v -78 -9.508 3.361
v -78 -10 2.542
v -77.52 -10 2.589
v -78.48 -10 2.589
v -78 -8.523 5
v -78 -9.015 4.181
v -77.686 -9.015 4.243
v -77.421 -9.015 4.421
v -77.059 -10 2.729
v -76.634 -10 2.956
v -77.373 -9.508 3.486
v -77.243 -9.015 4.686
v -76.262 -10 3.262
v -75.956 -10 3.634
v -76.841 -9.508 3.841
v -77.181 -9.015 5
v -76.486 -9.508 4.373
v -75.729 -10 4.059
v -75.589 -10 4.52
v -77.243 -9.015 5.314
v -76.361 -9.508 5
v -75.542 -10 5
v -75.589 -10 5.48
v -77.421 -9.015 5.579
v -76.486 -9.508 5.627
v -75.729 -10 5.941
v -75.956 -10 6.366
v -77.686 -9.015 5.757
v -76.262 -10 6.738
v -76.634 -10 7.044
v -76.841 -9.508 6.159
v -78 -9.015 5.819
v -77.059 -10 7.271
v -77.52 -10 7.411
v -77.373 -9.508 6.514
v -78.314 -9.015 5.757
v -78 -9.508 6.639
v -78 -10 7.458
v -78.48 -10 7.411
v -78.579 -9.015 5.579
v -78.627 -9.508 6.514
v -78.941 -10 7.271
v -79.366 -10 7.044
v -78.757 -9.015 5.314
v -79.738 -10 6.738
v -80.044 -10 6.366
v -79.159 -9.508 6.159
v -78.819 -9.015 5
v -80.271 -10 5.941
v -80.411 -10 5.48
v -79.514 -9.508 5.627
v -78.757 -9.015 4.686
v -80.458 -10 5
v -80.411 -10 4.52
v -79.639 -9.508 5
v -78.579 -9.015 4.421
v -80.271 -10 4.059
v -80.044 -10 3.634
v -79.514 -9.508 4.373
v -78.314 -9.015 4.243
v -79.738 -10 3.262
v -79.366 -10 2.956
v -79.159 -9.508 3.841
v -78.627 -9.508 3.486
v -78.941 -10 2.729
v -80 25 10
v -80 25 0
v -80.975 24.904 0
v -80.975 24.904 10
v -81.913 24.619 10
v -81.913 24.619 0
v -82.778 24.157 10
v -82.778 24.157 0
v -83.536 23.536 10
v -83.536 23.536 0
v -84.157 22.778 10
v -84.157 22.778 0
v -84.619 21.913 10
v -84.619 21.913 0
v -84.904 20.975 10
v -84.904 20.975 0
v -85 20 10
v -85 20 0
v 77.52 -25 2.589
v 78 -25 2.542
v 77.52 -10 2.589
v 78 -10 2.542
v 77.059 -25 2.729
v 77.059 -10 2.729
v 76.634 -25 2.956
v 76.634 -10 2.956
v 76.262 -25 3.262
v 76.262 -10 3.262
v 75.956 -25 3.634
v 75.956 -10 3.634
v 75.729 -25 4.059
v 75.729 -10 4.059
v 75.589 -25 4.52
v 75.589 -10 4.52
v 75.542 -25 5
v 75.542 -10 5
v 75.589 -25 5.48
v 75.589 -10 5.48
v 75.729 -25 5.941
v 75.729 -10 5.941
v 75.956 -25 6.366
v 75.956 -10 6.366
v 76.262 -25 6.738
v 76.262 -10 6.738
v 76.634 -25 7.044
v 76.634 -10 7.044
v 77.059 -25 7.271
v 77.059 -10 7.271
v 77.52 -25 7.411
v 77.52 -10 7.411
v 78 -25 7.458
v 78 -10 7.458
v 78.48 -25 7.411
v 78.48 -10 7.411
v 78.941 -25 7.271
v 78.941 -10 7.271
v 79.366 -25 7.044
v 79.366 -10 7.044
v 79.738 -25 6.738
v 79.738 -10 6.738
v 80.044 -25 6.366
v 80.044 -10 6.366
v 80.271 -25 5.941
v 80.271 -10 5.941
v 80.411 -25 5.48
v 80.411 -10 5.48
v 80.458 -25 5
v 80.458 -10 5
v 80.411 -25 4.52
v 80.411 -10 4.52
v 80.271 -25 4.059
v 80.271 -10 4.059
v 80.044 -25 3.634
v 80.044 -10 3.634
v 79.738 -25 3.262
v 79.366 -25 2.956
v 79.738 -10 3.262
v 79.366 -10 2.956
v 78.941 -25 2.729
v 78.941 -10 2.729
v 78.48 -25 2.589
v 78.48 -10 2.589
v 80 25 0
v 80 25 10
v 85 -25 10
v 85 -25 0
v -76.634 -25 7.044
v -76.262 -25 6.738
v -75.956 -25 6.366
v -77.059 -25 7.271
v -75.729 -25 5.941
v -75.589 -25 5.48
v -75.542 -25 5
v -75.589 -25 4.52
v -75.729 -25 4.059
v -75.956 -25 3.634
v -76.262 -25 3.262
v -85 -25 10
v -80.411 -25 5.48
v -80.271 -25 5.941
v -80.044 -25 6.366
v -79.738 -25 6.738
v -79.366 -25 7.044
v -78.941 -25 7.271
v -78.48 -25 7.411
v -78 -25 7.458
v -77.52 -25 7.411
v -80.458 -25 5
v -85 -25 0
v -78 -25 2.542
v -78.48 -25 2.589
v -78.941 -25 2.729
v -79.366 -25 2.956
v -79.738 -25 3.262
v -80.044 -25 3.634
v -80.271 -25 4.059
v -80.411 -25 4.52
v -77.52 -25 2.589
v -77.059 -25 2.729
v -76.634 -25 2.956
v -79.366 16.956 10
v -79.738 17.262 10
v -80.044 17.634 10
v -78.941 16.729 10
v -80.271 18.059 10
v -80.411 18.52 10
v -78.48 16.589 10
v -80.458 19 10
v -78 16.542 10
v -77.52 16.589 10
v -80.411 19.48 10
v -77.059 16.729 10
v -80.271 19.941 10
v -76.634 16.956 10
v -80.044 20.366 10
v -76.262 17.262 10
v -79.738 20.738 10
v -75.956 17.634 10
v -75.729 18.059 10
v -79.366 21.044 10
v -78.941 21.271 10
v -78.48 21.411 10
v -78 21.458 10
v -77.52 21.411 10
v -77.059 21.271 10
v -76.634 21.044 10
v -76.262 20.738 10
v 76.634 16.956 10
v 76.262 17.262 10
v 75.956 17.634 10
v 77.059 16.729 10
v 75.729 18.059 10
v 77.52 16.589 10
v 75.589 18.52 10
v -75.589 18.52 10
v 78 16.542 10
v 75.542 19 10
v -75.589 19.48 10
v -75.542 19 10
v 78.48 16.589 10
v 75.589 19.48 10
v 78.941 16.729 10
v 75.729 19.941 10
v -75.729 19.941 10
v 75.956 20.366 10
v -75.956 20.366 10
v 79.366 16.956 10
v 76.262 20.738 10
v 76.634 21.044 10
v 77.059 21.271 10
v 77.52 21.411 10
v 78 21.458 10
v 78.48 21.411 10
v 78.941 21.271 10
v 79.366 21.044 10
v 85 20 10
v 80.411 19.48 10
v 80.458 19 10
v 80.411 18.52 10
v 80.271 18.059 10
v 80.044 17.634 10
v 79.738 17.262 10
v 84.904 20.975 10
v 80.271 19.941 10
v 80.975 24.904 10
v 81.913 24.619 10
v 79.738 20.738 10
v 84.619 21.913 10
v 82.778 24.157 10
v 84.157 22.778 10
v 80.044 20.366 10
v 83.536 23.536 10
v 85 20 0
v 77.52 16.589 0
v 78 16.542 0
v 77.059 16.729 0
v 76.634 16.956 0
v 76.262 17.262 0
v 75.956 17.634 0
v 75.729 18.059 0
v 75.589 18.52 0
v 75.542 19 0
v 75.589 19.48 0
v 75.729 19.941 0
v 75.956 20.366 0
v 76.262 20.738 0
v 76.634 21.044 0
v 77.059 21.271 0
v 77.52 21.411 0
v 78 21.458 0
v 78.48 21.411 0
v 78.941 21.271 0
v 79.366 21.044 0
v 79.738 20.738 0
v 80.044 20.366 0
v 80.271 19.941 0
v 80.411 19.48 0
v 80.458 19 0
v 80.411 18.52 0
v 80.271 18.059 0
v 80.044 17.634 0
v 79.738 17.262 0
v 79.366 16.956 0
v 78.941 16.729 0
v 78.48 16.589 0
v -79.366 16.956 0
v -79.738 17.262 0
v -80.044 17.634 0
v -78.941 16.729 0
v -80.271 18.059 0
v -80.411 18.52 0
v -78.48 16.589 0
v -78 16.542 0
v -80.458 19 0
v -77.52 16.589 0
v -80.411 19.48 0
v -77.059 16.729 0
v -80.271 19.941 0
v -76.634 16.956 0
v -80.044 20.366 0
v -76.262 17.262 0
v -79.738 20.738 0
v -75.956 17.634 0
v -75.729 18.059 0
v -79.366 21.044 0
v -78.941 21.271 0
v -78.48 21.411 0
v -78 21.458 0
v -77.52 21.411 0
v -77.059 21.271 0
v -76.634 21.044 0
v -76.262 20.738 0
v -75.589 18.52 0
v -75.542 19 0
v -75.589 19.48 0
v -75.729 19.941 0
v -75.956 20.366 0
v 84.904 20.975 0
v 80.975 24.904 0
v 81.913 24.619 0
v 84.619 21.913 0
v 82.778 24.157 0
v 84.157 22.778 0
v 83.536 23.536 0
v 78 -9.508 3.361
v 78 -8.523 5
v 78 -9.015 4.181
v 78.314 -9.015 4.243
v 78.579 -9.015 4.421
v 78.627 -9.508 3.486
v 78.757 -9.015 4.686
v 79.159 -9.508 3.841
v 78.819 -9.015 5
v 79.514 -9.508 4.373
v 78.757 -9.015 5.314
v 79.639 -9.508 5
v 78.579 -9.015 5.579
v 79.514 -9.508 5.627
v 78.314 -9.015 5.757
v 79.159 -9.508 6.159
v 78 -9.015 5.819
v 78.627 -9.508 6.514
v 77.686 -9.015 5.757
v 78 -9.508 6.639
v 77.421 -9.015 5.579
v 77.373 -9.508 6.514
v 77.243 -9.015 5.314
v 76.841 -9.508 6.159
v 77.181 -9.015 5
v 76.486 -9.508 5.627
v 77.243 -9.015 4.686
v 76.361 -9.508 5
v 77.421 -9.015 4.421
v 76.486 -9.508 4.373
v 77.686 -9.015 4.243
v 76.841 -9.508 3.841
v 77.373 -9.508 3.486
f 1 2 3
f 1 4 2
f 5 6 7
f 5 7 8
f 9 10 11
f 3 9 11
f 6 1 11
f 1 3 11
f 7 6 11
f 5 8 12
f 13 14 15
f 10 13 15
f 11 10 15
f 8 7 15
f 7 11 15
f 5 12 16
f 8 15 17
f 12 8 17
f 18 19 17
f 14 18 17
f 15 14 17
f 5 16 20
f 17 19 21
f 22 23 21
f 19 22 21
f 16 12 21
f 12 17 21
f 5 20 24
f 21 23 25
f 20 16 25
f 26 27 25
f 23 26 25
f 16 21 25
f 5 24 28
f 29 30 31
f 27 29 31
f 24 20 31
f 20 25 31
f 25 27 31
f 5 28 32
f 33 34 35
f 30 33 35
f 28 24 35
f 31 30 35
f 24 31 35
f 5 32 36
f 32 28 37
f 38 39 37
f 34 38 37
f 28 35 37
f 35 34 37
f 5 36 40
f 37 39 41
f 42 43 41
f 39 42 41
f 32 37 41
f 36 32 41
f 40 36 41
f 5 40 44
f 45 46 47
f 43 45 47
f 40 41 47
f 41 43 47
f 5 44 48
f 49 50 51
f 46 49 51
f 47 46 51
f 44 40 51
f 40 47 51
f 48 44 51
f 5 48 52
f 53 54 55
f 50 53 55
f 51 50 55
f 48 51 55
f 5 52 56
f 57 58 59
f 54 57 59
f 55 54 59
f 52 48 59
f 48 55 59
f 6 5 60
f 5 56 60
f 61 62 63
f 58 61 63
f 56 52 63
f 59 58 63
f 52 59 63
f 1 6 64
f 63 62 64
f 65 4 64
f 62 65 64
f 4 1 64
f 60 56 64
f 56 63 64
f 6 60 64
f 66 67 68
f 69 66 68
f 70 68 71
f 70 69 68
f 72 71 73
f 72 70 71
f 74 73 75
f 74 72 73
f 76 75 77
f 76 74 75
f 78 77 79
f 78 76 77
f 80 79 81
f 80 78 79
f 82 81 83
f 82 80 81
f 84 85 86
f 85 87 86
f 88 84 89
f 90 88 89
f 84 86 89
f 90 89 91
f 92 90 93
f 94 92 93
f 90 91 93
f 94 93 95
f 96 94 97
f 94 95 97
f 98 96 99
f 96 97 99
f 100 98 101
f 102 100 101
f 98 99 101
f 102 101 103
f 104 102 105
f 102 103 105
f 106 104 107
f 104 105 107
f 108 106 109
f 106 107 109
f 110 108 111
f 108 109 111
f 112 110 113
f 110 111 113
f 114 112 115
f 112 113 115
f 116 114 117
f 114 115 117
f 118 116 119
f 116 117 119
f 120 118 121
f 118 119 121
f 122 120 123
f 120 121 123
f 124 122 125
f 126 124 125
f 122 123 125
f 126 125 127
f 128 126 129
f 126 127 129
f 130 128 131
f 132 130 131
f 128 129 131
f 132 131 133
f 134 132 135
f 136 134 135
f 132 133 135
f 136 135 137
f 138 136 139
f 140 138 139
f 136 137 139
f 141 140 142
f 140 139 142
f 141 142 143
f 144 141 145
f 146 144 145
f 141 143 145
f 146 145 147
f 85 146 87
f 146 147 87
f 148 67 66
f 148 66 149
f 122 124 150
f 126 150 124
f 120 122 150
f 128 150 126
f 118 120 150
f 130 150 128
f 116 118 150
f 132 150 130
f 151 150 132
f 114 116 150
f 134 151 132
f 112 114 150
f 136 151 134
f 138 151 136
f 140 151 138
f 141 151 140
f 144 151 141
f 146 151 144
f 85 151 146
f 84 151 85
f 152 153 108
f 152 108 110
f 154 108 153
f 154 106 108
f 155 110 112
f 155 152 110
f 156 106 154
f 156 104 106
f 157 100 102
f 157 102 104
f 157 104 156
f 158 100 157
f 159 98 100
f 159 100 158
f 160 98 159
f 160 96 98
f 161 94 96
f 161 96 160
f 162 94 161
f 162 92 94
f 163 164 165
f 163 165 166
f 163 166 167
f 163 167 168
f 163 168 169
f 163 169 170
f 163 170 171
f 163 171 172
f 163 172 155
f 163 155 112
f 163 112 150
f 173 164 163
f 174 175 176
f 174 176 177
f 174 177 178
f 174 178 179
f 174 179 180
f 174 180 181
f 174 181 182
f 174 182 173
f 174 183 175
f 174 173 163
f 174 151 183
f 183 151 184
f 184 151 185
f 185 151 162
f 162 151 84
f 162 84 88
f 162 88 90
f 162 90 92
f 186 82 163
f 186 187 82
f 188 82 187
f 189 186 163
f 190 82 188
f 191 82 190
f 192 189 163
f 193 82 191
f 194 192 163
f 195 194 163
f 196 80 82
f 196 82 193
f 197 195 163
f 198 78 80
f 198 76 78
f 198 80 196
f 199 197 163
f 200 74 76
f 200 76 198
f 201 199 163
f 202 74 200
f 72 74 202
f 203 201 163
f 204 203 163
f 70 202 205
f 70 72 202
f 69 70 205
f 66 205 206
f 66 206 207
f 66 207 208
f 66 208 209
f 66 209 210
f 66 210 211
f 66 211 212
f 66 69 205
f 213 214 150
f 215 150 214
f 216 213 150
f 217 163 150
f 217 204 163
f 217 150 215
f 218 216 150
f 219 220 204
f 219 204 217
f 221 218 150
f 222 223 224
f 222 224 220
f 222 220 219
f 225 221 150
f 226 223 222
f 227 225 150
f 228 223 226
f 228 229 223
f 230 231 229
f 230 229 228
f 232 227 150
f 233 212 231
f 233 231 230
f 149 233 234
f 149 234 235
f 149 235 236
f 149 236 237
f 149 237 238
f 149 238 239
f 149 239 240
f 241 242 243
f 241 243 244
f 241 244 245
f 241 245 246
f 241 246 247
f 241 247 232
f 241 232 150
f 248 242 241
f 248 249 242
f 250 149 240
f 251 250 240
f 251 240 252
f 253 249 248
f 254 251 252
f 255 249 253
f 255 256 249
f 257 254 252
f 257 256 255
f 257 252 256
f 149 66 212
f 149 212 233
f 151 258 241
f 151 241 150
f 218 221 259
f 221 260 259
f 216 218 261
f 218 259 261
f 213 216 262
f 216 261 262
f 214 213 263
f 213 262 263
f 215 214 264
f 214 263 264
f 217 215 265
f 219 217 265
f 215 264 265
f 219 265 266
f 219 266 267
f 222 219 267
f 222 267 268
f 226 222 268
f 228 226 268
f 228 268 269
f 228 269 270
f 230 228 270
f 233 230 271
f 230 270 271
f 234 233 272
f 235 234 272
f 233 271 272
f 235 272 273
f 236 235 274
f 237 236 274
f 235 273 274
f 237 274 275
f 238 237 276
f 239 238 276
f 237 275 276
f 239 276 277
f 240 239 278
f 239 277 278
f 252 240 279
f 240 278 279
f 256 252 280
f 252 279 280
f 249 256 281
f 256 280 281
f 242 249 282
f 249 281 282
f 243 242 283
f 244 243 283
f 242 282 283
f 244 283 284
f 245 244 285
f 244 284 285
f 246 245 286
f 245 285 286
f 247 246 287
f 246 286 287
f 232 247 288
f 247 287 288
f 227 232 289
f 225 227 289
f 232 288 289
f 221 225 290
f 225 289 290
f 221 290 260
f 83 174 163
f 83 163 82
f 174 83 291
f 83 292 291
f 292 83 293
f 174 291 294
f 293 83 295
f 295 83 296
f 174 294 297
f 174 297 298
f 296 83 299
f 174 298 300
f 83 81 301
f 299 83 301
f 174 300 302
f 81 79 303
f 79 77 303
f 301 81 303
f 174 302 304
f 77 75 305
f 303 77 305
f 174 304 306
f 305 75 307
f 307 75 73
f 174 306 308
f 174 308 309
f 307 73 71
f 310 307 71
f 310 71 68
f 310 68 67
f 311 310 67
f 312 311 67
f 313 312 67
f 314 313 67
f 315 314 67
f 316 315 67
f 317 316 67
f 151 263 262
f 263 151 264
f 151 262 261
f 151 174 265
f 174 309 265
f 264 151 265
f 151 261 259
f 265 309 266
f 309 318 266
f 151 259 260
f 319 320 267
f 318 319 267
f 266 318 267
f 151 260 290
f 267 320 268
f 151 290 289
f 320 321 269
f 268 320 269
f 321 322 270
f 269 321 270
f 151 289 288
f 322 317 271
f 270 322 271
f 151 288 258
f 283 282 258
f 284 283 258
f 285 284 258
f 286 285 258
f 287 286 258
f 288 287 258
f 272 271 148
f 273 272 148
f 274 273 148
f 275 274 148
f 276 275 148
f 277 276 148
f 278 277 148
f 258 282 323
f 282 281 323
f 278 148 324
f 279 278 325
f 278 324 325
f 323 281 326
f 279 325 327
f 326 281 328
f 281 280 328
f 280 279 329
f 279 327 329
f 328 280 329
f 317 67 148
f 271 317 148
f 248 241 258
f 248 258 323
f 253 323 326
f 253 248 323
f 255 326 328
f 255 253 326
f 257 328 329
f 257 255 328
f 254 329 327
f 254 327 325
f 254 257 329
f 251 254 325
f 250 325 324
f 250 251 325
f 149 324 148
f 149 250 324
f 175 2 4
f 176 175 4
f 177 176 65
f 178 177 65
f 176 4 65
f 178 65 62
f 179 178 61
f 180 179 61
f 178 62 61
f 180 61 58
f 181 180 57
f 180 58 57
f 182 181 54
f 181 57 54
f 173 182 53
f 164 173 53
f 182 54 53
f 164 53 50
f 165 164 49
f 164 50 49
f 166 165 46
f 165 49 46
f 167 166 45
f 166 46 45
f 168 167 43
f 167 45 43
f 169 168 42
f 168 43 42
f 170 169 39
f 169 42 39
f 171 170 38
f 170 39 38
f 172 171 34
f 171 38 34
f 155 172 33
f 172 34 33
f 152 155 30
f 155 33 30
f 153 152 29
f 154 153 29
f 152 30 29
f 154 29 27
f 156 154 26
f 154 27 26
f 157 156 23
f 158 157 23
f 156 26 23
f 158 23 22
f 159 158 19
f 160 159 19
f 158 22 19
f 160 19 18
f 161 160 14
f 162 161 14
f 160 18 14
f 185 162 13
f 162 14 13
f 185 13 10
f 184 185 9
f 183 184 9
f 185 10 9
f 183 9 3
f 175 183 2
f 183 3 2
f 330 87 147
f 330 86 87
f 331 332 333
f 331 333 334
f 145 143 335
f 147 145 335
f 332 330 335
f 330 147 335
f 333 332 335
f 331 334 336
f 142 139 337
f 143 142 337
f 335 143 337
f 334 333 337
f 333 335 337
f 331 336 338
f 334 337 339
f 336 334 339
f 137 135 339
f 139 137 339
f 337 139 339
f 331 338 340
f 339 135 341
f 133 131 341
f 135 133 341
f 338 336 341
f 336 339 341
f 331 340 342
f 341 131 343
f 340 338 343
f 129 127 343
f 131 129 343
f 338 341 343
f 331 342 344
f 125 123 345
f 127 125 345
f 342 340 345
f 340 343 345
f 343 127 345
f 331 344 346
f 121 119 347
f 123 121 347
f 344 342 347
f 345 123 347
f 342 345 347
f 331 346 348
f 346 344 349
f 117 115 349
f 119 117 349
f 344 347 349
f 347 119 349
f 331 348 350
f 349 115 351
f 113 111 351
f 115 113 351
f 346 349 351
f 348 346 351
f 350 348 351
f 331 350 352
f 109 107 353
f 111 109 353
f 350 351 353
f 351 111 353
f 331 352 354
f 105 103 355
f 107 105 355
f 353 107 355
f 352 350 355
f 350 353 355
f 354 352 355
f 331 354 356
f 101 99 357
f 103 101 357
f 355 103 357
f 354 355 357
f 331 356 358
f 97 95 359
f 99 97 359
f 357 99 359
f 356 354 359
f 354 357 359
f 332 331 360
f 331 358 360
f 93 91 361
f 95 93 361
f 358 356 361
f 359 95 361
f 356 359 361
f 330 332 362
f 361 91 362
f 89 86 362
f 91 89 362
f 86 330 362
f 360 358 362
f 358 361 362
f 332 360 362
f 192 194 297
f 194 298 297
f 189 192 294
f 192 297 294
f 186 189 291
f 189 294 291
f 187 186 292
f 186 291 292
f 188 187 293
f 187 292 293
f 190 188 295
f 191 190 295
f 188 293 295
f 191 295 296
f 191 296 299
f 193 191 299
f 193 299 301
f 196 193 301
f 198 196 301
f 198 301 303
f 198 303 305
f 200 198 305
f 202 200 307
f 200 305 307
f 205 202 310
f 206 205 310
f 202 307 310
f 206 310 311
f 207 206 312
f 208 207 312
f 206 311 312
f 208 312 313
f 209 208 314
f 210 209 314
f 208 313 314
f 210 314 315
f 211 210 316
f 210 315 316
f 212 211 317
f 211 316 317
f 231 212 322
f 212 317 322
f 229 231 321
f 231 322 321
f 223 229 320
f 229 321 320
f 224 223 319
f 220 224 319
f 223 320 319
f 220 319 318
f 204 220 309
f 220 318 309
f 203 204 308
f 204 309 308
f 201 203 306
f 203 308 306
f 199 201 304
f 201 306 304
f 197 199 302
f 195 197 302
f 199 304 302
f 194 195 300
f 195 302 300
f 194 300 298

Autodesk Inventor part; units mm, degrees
ref_plane "YZ Plane" through (0, 0, 0) normal (1, 0, 0) x (0, 1, 0)
ref_plane "XZ Plane" through (0, 0, 0) normal (0, 1, 0) x (-1, 0, 0)
ref_plane "XY Plane" through (0, 0, 0) normal (0, 0, 1) x (1, 0, 0)
sketch "Sketch1" plane through (0, 0, 0) normal (0, 0, 1) x (1, 0, 0)
  line L0 (85, -25) -> (-85, -25)
  line L1 (-85, -25) -> (-85, 25)
  line L2 (-85, 25) -> (85, 25)
  line L3 (85, 25) -> (85, -25)
  line L4 (85, -25) -> (-85, 25) construction
  line L5 (-85, -25) -> (85, 25) construction
  point P0 (0, 0)
  dimension "d0" = 170
  dimension "d1" = 50
extrude "Extrusion1" add sketch "Sketch1" along normal blind 10
sketch "Sketch2" plane through (0, 0, 10) normal (0, 0, 1) x (1, 0, 0)
  line L0 (85, 25) -> (-85, 25) construction
  line L1 (0, 25) -> (0, -25) construction
  line L2 (-85, -25) -> (85, -25) construction
  line L3 (-85, 25) -> (-85, -25) projected
  line L4 (85, -25) -> (85, 25) projected
  point P0 (0, 0)
  point P1 (-78, 19)
  point P2 (78, 19)
  dimension "d4" = 7
  dimension "d5" = 6
hole "Hole1" at (-78, 19, 10) at (78, 19, 10) direction (0, 0, -1) diameter 4.917 end through all thread size "M6x1" class "6H" standard "ISO Metric profile"
sketch "Sketch3" plane through (-85, -25, 0) normal (0, -1, 0) x (1, 0, 0)
  line L0 (0, 0) -> (0, 10) projected
  line L1 (0, 10) -> (170, 10) projected
  line L2 (85, 0) -> (85, 10) construction
  point P0 (7, 5)
  point P1 (0, 5)
  point P2 (163, 5)
  dimension "d24" = 5
  dimension "d25" = 7
hole "Hole2" at (-78, -25, 5) at (78, -25, 5) direction (0, 1, 0) diameter 4.917 depth 15 tip angle 118 thread size "M6x1" class "6H" standard "ISO Metric profile"
fillet "Fillet1" radius 5 2 edges at (-85, 25, 5) (85, 25, 5)
properties part number "Support_driver" material "Stainless Steel"
